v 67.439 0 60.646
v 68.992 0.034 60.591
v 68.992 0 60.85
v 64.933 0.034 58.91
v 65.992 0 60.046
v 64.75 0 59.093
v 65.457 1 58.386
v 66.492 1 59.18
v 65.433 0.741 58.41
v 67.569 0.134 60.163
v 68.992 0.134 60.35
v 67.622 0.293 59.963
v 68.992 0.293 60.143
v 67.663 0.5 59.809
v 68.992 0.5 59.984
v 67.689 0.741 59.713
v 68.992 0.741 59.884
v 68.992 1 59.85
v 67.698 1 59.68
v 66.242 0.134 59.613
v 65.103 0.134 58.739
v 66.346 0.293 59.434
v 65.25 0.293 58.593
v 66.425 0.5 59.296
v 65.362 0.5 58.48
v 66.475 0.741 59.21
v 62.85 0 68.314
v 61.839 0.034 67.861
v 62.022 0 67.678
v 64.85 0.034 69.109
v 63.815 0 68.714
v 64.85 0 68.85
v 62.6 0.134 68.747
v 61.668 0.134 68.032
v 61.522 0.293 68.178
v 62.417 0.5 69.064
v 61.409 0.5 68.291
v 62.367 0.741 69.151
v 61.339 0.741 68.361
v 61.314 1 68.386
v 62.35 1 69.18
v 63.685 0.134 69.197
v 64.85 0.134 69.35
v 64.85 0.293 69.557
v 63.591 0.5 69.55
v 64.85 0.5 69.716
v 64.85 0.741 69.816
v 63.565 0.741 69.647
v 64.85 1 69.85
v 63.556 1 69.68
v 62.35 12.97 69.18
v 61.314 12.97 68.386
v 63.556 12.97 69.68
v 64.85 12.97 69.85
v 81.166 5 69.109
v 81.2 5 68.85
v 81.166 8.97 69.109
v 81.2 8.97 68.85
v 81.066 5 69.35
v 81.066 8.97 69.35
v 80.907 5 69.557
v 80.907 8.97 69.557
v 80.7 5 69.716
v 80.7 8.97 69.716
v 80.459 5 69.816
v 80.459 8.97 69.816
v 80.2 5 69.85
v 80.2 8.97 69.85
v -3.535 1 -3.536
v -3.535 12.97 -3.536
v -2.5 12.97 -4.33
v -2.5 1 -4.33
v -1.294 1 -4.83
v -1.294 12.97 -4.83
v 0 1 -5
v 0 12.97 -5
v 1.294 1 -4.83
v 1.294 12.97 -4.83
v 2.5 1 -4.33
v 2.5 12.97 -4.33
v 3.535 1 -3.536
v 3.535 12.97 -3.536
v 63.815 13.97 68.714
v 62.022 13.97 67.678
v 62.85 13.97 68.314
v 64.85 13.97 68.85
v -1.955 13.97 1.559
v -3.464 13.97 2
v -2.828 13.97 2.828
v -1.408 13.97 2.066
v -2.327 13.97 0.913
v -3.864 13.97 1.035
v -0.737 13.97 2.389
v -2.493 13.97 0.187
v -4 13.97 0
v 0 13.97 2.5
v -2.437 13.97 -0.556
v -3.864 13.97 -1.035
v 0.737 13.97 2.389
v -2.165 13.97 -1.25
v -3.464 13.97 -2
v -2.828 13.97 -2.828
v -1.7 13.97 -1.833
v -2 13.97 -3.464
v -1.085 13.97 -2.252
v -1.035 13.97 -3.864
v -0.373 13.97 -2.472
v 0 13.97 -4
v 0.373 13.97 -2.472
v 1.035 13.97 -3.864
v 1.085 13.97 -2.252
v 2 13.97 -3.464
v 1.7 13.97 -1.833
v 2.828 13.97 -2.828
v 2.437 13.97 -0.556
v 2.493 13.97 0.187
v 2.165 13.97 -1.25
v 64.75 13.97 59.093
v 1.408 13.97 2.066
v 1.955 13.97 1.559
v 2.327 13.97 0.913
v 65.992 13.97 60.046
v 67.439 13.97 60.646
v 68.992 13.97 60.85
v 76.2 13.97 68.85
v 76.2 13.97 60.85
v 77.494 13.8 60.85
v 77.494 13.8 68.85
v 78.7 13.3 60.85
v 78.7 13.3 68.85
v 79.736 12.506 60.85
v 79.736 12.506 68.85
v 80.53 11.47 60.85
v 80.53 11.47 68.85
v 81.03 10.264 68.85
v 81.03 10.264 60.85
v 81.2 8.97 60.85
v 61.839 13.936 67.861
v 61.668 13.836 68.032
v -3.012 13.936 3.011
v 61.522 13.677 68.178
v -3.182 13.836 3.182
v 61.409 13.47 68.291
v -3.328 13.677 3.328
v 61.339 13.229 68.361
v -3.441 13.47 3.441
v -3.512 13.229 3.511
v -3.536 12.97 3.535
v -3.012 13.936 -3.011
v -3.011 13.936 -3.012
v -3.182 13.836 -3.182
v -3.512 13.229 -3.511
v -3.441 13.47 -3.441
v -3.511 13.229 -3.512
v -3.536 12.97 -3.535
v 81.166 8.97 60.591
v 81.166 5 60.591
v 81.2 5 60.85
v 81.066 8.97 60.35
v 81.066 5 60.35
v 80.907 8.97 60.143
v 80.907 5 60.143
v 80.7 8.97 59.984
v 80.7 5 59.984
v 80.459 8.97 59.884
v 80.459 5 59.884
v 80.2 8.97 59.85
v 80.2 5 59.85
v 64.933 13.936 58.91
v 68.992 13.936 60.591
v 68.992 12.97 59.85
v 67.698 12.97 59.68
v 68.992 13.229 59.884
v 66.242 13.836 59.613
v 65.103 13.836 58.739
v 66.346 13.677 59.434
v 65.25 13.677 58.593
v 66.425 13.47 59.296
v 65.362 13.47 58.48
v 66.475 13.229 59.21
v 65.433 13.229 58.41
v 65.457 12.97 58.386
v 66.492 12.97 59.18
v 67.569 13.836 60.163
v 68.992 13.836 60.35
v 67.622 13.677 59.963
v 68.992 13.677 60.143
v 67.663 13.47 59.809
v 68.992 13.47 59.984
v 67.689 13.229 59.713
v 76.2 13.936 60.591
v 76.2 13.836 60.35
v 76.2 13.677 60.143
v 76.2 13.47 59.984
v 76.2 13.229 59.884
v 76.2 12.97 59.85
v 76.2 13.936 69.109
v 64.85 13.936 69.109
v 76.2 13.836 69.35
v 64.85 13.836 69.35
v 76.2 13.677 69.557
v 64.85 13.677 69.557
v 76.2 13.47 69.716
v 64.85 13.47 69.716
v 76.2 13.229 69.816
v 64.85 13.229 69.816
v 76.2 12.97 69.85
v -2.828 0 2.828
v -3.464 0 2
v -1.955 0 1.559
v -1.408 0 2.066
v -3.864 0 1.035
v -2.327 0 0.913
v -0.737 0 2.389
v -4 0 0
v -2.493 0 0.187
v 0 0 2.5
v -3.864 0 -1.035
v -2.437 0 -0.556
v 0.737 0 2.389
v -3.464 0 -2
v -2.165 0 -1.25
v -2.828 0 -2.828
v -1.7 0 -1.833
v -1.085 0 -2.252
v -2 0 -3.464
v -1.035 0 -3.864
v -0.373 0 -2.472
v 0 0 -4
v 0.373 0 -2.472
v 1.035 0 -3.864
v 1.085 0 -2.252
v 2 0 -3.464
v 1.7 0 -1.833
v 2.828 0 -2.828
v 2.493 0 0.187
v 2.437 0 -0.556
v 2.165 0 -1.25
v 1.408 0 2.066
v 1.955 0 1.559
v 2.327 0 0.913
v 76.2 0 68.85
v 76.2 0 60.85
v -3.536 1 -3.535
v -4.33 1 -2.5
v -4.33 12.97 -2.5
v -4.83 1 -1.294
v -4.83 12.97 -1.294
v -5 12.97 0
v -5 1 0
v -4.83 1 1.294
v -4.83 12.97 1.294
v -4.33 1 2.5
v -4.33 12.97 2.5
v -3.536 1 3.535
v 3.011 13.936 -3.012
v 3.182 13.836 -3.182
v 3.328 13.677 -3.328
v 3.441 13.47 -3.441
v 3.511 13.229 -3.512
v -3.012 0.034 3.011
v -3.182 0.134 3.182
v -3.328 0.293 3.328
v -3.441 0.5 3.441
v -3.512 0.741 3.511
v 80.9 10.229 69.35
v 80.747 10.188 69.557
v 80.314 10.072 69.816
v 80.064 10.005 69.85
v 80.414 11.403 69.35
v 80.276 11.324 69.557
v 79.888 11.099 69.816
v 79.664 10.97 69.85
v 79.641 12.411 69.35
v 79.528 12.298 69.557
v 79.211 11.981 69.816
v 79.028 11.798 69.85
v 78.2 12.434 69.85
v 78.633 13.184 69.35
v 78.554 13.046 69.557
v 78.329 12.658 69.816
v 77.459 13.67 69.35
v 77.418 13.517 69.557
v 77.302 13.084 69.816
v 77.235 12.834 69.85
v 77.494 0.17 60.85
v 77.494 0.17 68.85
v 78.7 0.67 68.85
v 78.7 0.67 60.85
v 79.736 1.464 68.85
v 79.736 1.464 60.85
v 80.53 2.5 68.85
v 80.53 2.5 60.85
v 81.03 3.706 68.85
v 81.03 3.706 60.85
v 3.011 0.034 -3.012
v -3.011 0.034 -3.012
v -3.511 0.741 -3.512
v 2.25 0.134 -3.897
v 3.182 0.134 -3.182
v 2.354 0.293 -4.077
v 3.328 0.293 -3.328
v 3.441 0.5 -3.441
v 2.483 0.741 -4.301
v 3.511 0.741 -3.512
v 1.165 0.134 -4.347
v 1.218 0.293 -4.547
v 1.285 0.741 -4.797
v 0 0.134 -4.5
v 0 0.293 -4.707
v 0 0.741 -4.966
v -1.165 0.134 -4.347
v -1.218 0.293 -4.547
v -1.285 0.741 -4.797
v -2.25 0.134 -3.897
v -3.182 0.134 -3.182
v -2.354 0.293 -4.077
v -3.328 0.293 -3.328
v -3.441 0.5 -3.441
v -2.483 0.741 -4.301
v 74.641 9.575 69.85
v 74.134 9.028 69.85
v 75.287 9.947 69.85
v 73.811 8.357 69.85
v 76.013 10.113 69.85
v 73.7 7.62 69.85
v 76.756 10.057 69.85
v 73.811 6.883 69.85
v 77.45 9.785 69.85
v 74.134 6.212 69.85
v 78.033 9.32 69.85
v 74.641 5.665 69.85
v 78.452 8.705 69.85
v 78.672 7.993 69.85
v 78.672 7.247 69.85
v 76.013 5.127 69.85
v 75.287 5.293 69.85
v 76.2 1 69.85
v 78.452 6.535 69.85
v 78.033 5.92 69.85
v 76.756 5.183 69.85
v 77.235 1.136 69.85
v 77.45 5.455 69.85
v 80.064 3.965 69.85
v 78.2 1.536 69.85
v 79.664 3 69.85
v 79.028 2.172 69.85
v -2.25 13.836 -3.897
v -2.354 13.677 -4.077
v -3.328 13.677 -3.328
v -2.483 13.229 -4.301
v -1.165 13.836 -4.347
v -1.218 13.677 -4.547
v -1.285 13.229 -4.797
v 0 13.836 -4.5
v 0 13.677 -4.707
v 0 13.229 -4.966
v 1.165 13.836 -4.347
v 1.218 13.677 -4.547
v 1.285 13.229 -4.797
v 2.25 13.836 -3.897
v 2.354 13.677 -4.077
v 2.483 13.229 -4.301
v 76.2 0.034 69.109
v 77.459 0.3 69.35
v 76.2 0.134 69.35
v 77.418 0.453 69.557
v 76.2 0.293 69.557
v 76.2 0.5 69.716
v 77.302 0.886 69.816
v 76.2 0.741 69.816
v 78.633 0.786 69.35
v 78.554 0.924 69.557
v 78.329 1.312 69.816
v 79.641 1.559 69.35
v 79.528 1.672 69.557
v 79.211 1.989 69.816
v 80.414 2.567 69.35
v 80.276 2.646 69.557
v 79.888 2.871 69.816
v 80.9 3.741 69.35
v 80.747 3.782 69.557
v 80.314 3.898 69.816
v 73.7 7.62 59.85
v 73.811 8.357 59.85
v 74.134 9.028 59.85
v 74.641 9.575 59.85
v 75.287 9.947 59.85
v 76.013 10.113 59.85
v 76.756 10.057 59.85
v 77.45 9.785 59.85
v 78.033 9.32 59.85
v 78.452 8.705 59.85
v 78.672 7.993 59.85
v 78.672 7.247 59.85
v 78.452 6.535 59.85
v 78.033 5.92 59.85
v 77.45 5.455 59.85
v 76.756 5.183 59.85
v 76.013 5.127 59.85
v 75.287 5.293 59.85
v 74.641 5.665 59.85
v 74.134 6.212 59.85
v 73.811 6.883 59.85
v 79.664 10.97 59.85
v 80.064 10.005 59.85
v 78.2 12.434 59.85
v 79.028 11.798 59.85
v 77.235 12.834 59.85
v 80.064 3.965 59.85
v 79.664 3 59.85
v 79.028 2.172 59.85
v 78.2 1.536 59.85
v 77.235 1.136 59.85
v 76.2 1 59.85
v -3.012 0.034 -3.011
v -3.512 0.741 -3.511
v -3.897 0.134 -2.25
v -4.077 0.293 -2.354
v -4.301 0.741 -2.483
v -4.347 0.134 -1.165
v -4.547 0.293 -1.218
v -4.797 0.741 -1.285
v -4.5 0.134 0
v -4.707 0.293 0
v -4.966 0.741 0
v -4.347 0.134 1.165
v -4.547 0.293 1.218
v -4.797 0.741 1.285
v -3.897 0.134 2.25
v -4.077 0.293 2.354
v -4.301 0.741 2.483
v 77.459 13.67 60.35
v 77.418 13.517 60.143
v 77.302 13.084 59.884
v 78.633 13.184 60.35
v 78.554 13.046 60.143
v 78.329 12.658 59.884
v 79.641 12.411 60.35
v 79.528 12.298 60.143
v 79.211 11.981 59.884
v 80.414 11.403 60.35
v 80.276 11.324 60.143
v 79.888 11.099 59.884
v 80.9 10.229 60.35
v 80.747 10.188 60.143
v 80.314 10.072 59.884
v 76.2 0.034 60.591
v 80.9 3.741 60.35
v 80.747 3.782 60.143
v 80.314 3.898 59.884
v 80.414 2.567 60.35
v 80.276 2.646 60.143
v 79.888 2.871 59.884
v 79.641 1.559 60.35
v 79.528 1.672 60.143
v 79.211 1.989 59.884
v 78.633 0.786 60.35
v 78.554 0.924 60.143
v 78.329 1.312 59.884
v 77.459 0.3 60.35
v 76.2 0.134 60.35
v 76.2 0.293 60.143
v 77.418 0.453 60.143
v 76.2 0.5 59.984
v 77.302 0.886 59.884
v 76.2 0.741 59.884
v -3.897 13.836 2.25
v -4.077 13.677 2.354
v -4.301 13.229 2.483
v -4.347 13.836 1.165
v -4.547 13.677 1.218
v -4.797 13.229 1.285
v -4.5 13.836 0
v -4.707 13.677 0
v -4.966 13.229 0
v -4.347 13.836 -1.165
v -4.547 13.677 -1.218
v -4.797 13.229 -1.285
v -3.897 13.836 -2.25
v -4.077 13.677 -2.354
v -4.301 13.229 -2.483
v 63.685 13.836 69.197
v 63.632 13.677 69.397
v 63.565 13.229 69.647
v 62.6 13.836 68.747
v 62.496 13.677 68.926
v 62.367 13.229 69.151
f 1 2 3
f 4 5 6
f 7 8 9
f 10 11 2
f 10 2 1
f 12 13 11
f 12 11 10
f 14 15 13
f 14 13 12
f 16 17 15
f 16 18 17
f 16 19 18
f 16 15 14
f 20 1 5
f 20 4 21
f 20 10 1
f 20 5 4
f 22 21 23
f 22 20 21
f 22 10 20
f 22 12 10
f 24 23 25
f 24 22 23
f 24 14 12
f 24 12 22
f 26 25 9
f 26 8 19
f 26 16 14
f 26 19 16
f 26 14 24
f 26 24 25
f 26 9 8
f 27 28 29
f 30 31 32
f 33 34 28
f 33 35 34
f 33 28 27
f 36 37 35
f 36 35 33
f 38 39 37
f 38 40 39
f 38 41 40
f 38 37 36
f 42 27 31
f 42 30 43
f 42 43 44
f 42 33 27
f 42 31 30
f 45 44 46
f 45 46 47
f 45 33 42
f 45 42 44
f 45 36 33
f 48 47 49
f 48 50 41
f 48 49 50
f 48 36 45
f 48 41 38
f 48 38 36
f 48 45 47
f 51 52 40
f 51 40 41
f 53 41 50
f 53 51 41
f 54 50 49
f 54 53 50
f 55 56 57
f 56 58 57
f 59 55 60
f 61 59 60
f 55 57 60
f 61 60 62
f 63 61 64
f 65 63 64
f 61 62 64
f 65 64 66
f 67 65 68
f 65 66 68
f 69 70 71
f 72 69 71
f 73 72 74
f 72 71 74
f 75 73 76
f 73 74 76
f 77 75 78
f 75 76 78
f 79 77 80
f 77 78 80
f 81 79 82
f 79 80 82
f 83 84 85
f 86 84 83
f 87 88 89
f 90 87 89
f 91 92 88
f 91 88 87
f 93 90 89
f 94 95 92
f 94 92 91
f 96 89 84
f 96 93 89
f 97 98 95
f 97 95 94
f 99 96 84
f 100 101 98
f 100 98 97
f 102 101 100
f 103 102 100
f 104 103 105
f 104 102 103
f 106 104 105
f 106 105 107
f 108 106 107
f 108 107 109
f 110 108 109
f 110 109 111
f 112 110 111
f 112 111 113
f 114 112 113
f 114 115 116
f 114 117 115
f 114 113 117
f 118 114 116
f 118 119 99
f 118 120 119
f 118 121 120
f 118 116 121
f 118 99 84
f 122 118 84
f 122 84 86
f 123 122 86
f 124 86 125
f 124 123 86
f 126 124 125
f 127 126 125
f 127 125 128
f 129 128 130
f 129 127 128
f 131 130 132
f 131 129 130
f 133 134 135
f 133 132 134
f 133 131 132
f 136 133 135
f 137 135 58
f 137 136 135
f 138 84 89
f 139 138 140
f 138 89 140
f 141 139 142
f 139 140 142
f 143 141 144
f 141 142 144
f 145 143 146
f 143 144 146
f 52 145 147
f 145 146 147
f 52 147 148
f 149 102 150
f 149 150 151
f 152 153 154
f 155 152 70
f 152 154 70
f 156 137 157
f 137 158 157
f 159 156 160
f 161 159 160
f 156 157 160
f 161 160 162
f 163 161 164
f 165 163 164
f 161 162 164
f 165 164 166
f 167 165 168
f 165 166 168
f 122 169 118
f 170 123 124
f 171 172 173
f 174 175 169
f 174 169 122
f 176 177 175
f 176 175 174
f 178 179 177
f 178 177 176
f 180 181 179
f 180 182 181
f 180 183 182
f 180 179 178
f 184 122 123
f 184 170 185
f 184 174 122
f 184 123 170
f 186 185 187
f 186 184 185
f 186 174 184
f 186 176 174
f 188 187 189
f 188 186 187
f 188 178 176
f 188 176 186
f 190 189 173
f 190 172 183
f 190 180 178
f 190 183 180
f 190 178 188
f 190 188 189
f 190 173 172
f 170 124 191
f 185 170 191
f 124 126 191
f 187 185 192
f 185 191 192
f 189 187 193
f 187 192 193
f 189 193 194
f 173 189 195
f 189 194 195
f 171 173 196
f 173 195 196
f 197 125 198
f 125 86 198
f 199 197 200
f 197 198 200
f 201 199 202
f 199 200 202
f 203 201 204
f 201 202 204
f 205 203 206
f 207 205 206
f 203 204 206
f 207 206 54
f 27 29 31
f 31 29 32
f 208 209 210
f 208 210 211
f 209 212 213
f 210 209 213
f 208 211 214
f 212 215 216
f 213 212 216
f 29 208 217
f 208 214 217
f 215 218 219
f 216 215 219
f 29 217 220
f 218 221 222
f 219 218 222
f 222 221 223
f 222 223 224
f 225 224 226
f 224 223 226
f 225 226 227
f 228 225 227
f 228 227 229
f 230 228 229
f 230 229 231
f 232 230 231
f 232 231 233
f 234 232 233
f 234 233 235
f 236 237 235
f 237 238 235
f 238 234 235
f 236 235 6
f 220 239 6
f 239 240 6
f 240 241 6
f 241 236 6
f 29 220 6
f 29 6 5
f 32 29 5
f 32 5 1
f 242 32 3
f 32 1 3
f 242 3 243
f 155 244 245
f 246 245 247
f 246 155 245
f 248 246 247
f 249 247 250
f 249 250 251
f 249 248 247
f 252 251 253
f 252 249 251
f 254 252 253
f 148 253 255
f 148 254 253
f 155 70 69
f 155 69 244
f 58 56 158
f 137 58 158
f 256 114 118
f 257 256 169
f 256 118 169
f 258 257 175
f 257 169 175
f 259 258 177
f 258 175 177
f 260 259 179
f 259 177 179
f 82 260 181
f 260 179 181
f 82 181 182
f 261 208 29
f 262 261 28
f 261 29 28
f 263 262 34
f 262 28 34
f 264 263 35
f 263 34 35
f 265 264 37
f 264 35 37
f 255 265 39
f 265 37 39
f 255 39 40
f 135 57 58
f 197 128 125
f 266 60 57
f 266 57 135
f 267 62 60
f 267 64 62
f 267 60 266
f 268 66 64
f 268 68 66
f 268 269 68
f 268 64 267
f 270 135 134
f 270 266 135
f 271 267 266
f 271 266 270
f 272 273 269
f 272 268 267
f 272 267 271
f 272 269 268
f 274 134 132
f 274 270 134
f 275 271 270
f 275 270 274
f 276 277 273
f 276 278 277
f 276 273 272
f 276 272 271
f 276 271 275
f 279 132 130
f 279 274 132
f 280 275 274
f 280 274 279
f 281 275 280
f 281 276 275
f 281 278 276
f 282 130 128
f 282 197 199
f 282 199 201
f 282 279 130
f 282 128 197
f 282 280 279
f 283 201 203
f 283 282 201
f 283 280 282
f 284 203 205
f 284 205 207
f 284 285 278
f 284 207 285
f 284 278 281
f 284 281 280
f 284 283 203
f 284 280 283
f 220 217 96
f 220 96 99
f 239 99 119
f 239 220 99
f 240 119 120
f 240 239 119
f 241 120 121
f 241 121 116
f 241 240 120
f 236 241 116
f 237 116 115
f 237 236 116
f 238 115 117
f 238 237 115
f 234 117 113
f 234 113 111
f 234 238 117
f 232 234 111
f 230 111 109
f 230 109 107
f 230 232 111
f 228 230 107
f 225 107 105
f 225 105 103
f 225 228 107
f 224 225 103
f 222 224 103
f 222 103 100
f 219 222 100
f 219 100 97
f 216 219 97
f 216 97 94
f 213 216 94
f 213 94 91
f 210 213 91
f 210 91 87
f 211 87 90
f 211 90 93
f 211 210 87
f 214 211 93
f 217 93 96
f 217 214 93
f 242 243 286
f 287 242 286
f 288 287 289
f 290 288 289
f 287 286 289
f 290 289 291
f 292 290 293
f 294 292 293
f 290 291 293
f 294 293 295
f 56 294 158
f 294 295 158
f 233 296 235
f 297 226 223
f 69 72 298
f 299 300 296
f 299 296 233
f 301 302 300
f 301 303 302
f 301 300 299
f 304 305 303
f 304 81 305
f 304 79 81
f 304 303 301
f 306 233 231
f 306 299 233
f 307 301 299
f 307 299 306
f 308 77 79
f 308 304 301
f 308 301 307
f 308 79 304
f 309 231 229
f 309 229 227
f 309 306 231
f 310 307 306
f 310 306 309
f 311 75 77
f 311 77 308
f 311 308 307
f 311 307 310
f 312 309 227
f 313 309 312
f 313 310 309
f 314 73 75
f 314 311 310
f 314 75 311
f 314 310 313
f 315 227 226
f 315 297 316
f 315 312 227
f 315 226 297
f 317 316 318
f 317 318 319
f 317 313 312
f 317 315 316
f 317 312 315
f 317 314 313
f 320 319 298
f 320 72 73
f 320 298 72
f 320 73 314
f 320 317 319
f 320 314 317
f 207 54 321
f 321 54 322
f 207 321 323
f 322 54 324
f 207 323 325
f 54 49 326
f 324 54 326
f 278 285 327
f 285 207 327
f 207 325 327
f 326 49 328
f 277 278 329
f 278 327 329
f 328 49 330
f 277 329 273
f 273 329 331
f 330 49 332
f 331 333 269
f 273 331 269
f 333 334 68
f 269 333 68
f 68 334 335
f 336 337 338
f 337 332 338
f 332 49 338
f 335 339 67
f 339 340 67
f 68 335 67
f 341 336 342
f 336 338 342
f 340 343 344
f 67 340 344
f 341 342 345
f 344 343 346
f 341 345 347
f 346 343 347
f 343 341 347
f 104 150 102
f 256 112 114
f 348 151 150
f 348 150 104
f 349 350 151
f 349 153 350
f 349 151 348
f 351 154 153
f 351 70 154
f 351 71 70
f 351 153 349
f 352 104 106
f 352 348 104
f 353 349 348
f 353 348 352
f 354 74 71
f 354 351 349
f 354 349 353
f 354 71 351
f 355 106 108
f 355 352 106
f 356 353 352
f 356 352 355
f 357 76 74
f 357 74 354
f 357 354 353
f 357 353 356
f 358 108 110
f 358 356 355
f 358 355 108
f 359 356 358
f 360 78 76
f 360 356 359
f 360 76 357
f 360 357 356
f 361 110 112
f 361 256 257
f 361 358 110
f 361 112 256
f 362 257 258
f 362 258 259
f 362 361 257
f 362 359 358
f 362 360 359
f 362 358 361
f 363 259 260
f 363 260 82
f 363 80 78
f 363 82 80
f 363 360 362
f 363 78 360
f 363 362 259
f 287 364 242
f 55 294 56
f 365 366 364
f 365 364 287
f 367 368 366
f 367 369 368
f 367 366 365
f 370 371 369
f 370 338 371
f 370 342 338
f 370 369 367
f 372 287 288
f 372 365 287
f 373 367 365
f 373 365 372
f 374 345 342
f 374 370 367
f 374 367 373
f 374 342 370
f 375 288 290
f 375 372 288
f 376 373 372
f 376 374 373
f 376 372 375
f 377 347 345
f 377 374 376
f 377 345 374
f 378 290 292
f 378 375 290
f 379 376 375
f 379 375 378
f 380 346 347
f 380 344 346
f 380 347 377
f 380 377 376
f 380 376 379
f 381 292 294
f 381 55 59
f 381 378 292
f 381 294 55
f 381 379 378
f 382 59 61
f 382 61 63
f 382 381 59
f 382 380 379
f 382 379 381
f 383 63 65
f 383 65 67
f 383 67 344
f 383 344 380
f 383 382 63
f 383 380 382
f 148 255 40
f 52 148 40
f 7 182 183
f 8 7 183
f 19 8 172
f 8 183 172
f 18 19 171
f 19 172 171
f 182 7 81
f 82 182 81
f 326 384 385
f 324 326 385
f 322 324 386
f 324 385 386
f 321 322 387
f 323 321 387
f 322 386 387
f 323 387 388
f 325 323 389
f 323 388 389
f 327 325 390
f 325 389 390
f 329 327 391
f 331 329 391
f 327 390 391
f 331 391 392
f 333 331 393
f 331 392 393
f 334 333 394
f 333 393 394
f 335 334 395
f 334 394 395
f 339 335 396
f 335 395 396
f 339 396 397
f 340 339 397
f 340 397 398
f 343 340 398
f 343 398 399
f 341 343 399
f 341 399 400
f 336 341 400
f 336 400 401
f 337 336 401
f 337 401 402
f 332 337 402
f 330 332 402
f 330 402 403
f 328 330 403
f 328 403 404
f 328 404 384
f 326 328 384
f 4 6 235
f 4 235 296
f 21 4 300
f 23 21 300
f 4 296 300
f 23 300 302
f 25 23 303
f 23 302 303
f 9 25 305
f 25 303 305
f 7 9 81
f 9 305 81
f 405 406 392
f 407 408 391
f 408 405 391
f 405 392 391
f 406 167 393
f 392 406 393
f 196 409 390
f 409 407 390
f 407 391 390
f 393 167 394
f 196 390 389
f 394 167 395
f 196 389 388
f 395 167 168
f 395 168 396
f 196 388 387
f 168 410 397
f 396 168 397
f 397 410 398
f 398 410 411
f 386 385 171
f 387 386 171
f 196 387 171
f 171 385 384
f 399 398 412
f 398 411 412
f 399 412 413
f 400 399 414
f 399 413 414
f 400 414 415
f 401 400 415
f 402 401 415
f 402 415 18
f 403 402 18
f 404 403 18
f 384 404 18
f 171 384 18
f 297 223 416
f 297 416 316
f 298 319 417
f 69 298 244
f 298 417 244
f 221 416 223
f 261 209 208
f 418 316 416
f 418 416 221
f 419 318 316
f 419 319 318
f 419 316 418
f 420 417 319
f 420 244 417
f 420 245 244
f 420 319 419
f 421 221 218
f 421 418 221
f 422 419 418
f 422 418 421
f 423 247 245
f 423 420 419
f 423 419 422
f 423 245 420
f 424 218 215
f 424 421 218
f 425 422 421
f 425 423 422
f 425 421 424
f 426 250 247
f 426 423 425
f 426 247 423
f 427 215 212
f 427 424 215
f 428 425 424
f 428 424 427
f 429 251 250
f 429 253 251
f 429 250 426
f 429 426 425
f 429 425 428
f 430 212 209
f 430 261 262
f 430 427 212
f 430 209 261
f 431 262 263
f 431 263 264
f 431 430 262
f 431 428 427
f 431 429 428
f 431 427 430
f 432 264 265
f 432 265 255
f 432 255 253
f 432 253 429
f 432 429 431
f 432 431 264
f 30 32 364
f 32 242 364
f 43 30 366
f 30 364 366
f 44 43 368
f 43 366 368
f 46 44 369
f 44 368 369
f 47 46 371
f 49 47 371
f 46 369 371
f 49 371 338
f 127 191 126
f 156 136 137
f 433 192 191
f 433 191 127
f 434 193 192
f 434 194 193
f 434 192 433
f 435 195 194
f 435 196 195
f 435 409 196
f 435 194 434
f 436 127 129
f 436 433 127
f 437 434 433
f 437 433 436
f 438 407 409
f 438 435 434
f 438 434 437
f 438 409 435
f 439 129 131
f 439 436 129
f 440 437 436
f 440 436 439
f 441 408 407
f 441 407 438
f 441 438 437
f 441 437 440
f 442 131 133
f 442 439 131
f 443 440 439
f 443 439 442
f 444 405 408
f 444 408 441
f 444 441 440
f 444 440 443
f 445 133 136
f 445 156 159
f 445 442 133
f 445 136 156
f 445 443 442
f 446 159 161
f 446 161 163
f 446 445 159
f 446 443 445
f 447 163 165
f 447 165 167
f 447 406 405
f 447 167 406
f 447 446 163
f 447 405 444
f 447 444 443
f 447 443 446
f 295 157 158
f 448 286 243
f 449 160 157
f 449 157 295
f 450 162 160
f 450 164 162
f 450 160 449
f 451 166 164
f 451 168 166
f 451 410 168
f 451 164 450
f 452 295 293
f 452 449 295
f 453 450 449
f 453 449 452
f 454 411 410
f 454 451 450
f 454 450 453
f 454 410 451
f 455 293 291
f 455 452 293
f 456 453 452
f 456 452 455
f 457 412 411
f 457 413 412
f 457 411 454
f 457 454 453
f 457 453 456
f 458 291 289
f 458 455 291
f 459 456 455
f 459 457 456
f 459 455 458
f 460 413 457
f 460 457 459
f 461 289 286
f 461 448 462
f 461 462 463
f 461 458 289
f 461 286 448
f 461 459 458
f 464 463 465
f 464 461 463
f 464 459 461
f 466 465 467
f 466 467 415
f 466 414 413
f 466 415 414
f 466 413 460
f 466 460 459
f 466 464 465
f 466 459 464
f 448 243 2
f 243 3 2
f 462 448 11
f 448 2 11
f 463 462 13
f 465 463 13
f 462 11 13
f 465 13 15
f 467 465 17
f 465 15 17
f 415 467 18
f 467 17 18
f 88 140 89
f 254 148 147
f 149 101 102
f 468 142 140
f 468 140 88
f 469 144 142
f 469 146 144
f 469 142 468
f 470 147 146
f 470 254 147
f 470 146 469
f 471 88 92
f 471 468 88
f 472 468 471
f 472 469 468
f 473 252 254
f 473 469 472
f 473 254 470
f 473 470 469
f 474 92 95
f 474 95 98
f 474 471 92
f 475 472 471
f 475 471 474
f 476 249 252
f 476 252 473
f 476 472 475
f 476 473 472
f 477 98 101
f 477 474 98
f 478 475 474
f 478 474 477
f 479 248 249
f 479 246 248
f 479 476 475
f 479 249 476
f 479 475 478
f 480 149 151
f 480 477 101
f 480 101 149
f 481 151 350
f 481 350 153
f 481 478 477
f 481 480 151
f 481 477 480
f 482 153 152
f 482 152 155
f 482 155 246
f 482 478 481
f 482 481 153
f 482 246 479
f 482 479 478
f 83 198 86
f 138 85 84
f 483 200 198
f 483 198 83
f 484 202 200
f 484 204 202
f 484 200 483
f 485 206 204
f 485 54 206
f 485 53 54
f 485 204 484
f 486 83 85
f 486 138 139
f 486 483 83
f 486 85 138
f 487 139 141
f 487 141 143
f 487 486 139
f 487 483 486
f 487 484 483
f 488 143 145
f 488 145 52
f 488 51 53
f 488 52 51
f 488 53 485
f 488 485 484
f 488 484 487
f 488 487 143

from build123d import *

# Parameters (mm, degrees)
SKETCH1_R           = 2.5
BOSS_EXTRUDE1_DEPTH = 13.97
CUT_EXTRUDE1_REACH  = 108.146
SKETCH2_R           = 2.5
FILLET1_R           = 5
FILLET2_R           = 1


with BuildPart() as part:
    # Sketch1 → Boss-Extrude1 (new body)
    with BuildSketch(Plane(origin=(0, 0, 0), x_dir=(1, 0, 0), z_dir=(0, 1, 0))):
        Polygon((0, 7.071067812), (-7.071067812, 0), (62.778932188, -69.85), (81.2, -69.85), (81.2, -59.85), (66.921067812, -59.85), align=None)
        with Locations(Location((0, 0, 0), (0, 0, 270))):
            Circle(SKETCH1_R, mode=Mode.SUBTRACT)
    extrude(amount=BOSS_EXTRUDE1_DEPTH)

    # Sketch2 → Cut-Extrude1 (cut, up to next)
    with BuildSketch(Plane(origin=(0, 0, 59.85), x_dir=(-1, 0, 0), z_dir=(0, 0, -1)), mode=Mode.PRIVATE) as cut_extrude1_sk1:
        with Locations((-76.2, 7.62)):
            Circle(SKETCH2_R)
    cut_extrude1_tool1 = extrude(cut_extrude1_sk1.sketch, amount=-CUT_EXTRUDE1_REACH, mode=Mode.PRIVATE) & part.part
    add(cut_extrude1_tool1.solids().sort_by_distance((76.2, 7.62, 59.85))[0], mode=Mode.SUBTRACT)

    # Fillet1
    fillet1_edges = [part.edges().sort_by_distance(p)[0] for p in [
        (0, 6.985, -7.071067812),
        (-7.071067812, 6.985, 0),
        (81.2, 0, 64.85),
        (81.2, 13.97, 64.85),
        (62.778932188, 6.985, 69.85),
        (66.921067812, 6.985, 59.85),
    ]]
    fillet(fillet1_edges, radius=FILLET1_R - 0.0001)  # a hair under: the kernel refuses the full size

    # Fillet2
    fillet2_edges = [part.edges().sort_by_distance(p)[0] for p in [
        (70.525029289, 0, 69.85),
        (28.889445383, 0, 35.960513195),
        (34.496047101, 0, 27.424979289),
        (72.596097101, 0, 59.85),
        (62.936579685, 0, 69.469405275),
        (-5.000041421, 0, 0),
        (0, 0, -5.000041421),
        (34.496047101, 13.97, 27.424979289),
        (72.596097101, 13.97, 59.85),
        (28.889445383, 13.97, 35.960513195),
        (70.525029289, 13.97, 69.85),
        (62.936579685, 13.97, 69.469405275),
        (-5.000041421, 13.97, 0),
        (0, 13.97, -5.000041421),
        (81.2, 6.985, 59.85),
        (81.2, 6.985, 69.85),
        (79.735563195, 12.505563195, 59.85),
        (79.735563195, 1.464436805, 59.85),
        (79.735563195, 12.505563195, 69.85),
        (79.735563195, 1.464436805, 69.85),
        (67.078715309, 0, 59.469405275),
        (67.078715309, 13.97, 59.469405275),
    ]]
    fillet(fillet2_edges, radius=FILLET2_R)


solid = part.part
